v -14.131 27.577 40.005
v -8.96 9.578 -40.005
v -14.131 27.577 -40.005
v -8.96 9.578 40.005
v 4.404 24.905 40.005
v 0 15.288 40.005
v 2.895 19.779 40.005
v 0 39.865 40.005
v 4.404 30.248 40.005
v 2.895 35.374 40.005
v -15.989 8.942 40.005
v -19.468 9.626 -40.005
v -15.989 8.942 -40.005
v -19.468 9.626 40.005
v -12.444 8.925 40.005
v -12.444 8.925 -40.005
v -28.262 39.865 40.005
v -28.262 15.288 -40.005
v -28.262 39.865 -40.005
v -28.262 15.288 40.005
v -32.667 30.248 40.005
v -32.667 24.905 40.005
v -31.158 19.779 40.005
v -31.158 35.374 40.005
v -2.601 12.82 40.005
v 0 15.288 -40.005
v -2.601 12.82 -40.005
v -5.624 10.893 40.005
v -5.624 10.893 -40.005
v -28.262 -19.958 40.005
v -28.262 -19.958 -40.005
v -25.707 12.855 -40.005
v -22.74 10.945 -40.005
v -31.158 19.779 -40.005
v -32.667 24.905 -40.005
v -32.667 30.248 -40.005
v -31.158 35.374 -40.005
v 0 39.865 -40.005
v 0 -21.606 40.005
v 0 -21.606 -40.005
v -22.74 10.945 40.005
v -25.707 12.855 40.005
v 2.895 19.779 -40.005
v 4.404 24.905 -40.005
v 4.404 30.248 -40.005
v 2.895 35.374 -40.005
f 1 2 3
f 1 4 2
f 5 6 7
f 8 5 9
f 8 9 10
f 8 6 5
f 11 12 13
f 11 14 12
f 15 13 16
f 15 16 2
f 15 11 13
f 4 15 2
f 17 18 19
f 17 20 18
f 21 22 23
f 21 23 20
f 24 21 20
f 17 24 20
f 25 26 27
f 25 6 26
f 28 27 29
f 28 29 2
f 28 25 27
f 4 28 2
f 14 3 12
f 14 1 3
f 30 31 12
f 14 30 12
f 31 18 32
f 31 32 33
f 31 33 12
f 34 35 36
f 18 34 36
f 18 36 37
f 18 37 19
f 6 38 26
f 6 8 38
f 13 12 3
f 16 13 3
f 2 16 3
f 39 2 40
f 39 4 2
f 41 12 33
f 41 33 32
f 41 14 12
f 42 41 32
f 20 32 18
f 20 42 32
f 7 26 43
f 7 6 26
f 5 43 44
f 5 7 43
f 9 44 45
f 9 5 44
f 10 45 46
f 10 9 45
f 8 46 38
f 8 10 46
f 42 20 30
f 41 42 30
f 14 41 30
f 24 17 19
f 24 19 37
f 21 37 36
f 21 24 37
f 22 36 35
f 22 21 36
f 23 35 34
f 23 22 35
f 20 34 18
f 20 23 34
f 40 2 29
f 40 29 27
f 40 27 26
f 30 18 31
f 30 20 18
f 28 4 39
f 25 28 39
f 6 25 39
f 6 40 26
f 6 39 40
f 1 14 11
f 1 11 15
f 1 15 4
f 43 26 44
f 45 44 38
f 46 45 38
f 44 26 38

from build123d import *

# Parameters (mm, degrees)
F1_DEPTH = 40.005


with BuildPart() as f1:
    # F0 (on Top) → F1 (new body, symmetric)
    with BuildSketch(Plane.XY):
        with BuildLine():
            Line((0, 39.865449), (0, 15.287552))
            ThreePointArc((0, 15.287552), (4.596039, 27.576501), (0, 39.865449))
        make_face()
        with BuildLine():
            ThreePointArc((0, 15.287552), (-4.066409, 11.783822), (-8.95967, 9.577513))
            Line((-8.95967, 9.577513), (0, -21.605983))
            Line((0, -21.605983), (0, 15.287552))
        make_face()
        with BuildLine():
            Line((-14.131155, 27.576501), (-19.467581, 9.625725))
            ThreePointArc((-19.467581, 9.625725), (-14.217076, 8.849504), (-8.95967, 9.577513))
            Line((-8.95967, 9.577513), (-14.131155, 27.576501))
        make_face()
        with BuildLine():
            ThreePointArc((-19.467581, 9.625725), (-24.268253, 11.830166), (-28.26231, 15.287552))
            Line((-28.26231, 15.287552), (-28.26231, -19.958153))
            Line((-28.26231, -19.958153), (-19.467581, 9.625725))
        make_face()
        with BuildLine():
            Line((-28.26231, 15.287552), (-28.26231, 39.865449))
            ThreePointArc((-28.26231, 39.865449), (-32.858349, 27.576501), (-28.26231, 15.287552))
        make_face()
    extrude(amount=F1_DEPTH, both=True)


solid = f1.part
